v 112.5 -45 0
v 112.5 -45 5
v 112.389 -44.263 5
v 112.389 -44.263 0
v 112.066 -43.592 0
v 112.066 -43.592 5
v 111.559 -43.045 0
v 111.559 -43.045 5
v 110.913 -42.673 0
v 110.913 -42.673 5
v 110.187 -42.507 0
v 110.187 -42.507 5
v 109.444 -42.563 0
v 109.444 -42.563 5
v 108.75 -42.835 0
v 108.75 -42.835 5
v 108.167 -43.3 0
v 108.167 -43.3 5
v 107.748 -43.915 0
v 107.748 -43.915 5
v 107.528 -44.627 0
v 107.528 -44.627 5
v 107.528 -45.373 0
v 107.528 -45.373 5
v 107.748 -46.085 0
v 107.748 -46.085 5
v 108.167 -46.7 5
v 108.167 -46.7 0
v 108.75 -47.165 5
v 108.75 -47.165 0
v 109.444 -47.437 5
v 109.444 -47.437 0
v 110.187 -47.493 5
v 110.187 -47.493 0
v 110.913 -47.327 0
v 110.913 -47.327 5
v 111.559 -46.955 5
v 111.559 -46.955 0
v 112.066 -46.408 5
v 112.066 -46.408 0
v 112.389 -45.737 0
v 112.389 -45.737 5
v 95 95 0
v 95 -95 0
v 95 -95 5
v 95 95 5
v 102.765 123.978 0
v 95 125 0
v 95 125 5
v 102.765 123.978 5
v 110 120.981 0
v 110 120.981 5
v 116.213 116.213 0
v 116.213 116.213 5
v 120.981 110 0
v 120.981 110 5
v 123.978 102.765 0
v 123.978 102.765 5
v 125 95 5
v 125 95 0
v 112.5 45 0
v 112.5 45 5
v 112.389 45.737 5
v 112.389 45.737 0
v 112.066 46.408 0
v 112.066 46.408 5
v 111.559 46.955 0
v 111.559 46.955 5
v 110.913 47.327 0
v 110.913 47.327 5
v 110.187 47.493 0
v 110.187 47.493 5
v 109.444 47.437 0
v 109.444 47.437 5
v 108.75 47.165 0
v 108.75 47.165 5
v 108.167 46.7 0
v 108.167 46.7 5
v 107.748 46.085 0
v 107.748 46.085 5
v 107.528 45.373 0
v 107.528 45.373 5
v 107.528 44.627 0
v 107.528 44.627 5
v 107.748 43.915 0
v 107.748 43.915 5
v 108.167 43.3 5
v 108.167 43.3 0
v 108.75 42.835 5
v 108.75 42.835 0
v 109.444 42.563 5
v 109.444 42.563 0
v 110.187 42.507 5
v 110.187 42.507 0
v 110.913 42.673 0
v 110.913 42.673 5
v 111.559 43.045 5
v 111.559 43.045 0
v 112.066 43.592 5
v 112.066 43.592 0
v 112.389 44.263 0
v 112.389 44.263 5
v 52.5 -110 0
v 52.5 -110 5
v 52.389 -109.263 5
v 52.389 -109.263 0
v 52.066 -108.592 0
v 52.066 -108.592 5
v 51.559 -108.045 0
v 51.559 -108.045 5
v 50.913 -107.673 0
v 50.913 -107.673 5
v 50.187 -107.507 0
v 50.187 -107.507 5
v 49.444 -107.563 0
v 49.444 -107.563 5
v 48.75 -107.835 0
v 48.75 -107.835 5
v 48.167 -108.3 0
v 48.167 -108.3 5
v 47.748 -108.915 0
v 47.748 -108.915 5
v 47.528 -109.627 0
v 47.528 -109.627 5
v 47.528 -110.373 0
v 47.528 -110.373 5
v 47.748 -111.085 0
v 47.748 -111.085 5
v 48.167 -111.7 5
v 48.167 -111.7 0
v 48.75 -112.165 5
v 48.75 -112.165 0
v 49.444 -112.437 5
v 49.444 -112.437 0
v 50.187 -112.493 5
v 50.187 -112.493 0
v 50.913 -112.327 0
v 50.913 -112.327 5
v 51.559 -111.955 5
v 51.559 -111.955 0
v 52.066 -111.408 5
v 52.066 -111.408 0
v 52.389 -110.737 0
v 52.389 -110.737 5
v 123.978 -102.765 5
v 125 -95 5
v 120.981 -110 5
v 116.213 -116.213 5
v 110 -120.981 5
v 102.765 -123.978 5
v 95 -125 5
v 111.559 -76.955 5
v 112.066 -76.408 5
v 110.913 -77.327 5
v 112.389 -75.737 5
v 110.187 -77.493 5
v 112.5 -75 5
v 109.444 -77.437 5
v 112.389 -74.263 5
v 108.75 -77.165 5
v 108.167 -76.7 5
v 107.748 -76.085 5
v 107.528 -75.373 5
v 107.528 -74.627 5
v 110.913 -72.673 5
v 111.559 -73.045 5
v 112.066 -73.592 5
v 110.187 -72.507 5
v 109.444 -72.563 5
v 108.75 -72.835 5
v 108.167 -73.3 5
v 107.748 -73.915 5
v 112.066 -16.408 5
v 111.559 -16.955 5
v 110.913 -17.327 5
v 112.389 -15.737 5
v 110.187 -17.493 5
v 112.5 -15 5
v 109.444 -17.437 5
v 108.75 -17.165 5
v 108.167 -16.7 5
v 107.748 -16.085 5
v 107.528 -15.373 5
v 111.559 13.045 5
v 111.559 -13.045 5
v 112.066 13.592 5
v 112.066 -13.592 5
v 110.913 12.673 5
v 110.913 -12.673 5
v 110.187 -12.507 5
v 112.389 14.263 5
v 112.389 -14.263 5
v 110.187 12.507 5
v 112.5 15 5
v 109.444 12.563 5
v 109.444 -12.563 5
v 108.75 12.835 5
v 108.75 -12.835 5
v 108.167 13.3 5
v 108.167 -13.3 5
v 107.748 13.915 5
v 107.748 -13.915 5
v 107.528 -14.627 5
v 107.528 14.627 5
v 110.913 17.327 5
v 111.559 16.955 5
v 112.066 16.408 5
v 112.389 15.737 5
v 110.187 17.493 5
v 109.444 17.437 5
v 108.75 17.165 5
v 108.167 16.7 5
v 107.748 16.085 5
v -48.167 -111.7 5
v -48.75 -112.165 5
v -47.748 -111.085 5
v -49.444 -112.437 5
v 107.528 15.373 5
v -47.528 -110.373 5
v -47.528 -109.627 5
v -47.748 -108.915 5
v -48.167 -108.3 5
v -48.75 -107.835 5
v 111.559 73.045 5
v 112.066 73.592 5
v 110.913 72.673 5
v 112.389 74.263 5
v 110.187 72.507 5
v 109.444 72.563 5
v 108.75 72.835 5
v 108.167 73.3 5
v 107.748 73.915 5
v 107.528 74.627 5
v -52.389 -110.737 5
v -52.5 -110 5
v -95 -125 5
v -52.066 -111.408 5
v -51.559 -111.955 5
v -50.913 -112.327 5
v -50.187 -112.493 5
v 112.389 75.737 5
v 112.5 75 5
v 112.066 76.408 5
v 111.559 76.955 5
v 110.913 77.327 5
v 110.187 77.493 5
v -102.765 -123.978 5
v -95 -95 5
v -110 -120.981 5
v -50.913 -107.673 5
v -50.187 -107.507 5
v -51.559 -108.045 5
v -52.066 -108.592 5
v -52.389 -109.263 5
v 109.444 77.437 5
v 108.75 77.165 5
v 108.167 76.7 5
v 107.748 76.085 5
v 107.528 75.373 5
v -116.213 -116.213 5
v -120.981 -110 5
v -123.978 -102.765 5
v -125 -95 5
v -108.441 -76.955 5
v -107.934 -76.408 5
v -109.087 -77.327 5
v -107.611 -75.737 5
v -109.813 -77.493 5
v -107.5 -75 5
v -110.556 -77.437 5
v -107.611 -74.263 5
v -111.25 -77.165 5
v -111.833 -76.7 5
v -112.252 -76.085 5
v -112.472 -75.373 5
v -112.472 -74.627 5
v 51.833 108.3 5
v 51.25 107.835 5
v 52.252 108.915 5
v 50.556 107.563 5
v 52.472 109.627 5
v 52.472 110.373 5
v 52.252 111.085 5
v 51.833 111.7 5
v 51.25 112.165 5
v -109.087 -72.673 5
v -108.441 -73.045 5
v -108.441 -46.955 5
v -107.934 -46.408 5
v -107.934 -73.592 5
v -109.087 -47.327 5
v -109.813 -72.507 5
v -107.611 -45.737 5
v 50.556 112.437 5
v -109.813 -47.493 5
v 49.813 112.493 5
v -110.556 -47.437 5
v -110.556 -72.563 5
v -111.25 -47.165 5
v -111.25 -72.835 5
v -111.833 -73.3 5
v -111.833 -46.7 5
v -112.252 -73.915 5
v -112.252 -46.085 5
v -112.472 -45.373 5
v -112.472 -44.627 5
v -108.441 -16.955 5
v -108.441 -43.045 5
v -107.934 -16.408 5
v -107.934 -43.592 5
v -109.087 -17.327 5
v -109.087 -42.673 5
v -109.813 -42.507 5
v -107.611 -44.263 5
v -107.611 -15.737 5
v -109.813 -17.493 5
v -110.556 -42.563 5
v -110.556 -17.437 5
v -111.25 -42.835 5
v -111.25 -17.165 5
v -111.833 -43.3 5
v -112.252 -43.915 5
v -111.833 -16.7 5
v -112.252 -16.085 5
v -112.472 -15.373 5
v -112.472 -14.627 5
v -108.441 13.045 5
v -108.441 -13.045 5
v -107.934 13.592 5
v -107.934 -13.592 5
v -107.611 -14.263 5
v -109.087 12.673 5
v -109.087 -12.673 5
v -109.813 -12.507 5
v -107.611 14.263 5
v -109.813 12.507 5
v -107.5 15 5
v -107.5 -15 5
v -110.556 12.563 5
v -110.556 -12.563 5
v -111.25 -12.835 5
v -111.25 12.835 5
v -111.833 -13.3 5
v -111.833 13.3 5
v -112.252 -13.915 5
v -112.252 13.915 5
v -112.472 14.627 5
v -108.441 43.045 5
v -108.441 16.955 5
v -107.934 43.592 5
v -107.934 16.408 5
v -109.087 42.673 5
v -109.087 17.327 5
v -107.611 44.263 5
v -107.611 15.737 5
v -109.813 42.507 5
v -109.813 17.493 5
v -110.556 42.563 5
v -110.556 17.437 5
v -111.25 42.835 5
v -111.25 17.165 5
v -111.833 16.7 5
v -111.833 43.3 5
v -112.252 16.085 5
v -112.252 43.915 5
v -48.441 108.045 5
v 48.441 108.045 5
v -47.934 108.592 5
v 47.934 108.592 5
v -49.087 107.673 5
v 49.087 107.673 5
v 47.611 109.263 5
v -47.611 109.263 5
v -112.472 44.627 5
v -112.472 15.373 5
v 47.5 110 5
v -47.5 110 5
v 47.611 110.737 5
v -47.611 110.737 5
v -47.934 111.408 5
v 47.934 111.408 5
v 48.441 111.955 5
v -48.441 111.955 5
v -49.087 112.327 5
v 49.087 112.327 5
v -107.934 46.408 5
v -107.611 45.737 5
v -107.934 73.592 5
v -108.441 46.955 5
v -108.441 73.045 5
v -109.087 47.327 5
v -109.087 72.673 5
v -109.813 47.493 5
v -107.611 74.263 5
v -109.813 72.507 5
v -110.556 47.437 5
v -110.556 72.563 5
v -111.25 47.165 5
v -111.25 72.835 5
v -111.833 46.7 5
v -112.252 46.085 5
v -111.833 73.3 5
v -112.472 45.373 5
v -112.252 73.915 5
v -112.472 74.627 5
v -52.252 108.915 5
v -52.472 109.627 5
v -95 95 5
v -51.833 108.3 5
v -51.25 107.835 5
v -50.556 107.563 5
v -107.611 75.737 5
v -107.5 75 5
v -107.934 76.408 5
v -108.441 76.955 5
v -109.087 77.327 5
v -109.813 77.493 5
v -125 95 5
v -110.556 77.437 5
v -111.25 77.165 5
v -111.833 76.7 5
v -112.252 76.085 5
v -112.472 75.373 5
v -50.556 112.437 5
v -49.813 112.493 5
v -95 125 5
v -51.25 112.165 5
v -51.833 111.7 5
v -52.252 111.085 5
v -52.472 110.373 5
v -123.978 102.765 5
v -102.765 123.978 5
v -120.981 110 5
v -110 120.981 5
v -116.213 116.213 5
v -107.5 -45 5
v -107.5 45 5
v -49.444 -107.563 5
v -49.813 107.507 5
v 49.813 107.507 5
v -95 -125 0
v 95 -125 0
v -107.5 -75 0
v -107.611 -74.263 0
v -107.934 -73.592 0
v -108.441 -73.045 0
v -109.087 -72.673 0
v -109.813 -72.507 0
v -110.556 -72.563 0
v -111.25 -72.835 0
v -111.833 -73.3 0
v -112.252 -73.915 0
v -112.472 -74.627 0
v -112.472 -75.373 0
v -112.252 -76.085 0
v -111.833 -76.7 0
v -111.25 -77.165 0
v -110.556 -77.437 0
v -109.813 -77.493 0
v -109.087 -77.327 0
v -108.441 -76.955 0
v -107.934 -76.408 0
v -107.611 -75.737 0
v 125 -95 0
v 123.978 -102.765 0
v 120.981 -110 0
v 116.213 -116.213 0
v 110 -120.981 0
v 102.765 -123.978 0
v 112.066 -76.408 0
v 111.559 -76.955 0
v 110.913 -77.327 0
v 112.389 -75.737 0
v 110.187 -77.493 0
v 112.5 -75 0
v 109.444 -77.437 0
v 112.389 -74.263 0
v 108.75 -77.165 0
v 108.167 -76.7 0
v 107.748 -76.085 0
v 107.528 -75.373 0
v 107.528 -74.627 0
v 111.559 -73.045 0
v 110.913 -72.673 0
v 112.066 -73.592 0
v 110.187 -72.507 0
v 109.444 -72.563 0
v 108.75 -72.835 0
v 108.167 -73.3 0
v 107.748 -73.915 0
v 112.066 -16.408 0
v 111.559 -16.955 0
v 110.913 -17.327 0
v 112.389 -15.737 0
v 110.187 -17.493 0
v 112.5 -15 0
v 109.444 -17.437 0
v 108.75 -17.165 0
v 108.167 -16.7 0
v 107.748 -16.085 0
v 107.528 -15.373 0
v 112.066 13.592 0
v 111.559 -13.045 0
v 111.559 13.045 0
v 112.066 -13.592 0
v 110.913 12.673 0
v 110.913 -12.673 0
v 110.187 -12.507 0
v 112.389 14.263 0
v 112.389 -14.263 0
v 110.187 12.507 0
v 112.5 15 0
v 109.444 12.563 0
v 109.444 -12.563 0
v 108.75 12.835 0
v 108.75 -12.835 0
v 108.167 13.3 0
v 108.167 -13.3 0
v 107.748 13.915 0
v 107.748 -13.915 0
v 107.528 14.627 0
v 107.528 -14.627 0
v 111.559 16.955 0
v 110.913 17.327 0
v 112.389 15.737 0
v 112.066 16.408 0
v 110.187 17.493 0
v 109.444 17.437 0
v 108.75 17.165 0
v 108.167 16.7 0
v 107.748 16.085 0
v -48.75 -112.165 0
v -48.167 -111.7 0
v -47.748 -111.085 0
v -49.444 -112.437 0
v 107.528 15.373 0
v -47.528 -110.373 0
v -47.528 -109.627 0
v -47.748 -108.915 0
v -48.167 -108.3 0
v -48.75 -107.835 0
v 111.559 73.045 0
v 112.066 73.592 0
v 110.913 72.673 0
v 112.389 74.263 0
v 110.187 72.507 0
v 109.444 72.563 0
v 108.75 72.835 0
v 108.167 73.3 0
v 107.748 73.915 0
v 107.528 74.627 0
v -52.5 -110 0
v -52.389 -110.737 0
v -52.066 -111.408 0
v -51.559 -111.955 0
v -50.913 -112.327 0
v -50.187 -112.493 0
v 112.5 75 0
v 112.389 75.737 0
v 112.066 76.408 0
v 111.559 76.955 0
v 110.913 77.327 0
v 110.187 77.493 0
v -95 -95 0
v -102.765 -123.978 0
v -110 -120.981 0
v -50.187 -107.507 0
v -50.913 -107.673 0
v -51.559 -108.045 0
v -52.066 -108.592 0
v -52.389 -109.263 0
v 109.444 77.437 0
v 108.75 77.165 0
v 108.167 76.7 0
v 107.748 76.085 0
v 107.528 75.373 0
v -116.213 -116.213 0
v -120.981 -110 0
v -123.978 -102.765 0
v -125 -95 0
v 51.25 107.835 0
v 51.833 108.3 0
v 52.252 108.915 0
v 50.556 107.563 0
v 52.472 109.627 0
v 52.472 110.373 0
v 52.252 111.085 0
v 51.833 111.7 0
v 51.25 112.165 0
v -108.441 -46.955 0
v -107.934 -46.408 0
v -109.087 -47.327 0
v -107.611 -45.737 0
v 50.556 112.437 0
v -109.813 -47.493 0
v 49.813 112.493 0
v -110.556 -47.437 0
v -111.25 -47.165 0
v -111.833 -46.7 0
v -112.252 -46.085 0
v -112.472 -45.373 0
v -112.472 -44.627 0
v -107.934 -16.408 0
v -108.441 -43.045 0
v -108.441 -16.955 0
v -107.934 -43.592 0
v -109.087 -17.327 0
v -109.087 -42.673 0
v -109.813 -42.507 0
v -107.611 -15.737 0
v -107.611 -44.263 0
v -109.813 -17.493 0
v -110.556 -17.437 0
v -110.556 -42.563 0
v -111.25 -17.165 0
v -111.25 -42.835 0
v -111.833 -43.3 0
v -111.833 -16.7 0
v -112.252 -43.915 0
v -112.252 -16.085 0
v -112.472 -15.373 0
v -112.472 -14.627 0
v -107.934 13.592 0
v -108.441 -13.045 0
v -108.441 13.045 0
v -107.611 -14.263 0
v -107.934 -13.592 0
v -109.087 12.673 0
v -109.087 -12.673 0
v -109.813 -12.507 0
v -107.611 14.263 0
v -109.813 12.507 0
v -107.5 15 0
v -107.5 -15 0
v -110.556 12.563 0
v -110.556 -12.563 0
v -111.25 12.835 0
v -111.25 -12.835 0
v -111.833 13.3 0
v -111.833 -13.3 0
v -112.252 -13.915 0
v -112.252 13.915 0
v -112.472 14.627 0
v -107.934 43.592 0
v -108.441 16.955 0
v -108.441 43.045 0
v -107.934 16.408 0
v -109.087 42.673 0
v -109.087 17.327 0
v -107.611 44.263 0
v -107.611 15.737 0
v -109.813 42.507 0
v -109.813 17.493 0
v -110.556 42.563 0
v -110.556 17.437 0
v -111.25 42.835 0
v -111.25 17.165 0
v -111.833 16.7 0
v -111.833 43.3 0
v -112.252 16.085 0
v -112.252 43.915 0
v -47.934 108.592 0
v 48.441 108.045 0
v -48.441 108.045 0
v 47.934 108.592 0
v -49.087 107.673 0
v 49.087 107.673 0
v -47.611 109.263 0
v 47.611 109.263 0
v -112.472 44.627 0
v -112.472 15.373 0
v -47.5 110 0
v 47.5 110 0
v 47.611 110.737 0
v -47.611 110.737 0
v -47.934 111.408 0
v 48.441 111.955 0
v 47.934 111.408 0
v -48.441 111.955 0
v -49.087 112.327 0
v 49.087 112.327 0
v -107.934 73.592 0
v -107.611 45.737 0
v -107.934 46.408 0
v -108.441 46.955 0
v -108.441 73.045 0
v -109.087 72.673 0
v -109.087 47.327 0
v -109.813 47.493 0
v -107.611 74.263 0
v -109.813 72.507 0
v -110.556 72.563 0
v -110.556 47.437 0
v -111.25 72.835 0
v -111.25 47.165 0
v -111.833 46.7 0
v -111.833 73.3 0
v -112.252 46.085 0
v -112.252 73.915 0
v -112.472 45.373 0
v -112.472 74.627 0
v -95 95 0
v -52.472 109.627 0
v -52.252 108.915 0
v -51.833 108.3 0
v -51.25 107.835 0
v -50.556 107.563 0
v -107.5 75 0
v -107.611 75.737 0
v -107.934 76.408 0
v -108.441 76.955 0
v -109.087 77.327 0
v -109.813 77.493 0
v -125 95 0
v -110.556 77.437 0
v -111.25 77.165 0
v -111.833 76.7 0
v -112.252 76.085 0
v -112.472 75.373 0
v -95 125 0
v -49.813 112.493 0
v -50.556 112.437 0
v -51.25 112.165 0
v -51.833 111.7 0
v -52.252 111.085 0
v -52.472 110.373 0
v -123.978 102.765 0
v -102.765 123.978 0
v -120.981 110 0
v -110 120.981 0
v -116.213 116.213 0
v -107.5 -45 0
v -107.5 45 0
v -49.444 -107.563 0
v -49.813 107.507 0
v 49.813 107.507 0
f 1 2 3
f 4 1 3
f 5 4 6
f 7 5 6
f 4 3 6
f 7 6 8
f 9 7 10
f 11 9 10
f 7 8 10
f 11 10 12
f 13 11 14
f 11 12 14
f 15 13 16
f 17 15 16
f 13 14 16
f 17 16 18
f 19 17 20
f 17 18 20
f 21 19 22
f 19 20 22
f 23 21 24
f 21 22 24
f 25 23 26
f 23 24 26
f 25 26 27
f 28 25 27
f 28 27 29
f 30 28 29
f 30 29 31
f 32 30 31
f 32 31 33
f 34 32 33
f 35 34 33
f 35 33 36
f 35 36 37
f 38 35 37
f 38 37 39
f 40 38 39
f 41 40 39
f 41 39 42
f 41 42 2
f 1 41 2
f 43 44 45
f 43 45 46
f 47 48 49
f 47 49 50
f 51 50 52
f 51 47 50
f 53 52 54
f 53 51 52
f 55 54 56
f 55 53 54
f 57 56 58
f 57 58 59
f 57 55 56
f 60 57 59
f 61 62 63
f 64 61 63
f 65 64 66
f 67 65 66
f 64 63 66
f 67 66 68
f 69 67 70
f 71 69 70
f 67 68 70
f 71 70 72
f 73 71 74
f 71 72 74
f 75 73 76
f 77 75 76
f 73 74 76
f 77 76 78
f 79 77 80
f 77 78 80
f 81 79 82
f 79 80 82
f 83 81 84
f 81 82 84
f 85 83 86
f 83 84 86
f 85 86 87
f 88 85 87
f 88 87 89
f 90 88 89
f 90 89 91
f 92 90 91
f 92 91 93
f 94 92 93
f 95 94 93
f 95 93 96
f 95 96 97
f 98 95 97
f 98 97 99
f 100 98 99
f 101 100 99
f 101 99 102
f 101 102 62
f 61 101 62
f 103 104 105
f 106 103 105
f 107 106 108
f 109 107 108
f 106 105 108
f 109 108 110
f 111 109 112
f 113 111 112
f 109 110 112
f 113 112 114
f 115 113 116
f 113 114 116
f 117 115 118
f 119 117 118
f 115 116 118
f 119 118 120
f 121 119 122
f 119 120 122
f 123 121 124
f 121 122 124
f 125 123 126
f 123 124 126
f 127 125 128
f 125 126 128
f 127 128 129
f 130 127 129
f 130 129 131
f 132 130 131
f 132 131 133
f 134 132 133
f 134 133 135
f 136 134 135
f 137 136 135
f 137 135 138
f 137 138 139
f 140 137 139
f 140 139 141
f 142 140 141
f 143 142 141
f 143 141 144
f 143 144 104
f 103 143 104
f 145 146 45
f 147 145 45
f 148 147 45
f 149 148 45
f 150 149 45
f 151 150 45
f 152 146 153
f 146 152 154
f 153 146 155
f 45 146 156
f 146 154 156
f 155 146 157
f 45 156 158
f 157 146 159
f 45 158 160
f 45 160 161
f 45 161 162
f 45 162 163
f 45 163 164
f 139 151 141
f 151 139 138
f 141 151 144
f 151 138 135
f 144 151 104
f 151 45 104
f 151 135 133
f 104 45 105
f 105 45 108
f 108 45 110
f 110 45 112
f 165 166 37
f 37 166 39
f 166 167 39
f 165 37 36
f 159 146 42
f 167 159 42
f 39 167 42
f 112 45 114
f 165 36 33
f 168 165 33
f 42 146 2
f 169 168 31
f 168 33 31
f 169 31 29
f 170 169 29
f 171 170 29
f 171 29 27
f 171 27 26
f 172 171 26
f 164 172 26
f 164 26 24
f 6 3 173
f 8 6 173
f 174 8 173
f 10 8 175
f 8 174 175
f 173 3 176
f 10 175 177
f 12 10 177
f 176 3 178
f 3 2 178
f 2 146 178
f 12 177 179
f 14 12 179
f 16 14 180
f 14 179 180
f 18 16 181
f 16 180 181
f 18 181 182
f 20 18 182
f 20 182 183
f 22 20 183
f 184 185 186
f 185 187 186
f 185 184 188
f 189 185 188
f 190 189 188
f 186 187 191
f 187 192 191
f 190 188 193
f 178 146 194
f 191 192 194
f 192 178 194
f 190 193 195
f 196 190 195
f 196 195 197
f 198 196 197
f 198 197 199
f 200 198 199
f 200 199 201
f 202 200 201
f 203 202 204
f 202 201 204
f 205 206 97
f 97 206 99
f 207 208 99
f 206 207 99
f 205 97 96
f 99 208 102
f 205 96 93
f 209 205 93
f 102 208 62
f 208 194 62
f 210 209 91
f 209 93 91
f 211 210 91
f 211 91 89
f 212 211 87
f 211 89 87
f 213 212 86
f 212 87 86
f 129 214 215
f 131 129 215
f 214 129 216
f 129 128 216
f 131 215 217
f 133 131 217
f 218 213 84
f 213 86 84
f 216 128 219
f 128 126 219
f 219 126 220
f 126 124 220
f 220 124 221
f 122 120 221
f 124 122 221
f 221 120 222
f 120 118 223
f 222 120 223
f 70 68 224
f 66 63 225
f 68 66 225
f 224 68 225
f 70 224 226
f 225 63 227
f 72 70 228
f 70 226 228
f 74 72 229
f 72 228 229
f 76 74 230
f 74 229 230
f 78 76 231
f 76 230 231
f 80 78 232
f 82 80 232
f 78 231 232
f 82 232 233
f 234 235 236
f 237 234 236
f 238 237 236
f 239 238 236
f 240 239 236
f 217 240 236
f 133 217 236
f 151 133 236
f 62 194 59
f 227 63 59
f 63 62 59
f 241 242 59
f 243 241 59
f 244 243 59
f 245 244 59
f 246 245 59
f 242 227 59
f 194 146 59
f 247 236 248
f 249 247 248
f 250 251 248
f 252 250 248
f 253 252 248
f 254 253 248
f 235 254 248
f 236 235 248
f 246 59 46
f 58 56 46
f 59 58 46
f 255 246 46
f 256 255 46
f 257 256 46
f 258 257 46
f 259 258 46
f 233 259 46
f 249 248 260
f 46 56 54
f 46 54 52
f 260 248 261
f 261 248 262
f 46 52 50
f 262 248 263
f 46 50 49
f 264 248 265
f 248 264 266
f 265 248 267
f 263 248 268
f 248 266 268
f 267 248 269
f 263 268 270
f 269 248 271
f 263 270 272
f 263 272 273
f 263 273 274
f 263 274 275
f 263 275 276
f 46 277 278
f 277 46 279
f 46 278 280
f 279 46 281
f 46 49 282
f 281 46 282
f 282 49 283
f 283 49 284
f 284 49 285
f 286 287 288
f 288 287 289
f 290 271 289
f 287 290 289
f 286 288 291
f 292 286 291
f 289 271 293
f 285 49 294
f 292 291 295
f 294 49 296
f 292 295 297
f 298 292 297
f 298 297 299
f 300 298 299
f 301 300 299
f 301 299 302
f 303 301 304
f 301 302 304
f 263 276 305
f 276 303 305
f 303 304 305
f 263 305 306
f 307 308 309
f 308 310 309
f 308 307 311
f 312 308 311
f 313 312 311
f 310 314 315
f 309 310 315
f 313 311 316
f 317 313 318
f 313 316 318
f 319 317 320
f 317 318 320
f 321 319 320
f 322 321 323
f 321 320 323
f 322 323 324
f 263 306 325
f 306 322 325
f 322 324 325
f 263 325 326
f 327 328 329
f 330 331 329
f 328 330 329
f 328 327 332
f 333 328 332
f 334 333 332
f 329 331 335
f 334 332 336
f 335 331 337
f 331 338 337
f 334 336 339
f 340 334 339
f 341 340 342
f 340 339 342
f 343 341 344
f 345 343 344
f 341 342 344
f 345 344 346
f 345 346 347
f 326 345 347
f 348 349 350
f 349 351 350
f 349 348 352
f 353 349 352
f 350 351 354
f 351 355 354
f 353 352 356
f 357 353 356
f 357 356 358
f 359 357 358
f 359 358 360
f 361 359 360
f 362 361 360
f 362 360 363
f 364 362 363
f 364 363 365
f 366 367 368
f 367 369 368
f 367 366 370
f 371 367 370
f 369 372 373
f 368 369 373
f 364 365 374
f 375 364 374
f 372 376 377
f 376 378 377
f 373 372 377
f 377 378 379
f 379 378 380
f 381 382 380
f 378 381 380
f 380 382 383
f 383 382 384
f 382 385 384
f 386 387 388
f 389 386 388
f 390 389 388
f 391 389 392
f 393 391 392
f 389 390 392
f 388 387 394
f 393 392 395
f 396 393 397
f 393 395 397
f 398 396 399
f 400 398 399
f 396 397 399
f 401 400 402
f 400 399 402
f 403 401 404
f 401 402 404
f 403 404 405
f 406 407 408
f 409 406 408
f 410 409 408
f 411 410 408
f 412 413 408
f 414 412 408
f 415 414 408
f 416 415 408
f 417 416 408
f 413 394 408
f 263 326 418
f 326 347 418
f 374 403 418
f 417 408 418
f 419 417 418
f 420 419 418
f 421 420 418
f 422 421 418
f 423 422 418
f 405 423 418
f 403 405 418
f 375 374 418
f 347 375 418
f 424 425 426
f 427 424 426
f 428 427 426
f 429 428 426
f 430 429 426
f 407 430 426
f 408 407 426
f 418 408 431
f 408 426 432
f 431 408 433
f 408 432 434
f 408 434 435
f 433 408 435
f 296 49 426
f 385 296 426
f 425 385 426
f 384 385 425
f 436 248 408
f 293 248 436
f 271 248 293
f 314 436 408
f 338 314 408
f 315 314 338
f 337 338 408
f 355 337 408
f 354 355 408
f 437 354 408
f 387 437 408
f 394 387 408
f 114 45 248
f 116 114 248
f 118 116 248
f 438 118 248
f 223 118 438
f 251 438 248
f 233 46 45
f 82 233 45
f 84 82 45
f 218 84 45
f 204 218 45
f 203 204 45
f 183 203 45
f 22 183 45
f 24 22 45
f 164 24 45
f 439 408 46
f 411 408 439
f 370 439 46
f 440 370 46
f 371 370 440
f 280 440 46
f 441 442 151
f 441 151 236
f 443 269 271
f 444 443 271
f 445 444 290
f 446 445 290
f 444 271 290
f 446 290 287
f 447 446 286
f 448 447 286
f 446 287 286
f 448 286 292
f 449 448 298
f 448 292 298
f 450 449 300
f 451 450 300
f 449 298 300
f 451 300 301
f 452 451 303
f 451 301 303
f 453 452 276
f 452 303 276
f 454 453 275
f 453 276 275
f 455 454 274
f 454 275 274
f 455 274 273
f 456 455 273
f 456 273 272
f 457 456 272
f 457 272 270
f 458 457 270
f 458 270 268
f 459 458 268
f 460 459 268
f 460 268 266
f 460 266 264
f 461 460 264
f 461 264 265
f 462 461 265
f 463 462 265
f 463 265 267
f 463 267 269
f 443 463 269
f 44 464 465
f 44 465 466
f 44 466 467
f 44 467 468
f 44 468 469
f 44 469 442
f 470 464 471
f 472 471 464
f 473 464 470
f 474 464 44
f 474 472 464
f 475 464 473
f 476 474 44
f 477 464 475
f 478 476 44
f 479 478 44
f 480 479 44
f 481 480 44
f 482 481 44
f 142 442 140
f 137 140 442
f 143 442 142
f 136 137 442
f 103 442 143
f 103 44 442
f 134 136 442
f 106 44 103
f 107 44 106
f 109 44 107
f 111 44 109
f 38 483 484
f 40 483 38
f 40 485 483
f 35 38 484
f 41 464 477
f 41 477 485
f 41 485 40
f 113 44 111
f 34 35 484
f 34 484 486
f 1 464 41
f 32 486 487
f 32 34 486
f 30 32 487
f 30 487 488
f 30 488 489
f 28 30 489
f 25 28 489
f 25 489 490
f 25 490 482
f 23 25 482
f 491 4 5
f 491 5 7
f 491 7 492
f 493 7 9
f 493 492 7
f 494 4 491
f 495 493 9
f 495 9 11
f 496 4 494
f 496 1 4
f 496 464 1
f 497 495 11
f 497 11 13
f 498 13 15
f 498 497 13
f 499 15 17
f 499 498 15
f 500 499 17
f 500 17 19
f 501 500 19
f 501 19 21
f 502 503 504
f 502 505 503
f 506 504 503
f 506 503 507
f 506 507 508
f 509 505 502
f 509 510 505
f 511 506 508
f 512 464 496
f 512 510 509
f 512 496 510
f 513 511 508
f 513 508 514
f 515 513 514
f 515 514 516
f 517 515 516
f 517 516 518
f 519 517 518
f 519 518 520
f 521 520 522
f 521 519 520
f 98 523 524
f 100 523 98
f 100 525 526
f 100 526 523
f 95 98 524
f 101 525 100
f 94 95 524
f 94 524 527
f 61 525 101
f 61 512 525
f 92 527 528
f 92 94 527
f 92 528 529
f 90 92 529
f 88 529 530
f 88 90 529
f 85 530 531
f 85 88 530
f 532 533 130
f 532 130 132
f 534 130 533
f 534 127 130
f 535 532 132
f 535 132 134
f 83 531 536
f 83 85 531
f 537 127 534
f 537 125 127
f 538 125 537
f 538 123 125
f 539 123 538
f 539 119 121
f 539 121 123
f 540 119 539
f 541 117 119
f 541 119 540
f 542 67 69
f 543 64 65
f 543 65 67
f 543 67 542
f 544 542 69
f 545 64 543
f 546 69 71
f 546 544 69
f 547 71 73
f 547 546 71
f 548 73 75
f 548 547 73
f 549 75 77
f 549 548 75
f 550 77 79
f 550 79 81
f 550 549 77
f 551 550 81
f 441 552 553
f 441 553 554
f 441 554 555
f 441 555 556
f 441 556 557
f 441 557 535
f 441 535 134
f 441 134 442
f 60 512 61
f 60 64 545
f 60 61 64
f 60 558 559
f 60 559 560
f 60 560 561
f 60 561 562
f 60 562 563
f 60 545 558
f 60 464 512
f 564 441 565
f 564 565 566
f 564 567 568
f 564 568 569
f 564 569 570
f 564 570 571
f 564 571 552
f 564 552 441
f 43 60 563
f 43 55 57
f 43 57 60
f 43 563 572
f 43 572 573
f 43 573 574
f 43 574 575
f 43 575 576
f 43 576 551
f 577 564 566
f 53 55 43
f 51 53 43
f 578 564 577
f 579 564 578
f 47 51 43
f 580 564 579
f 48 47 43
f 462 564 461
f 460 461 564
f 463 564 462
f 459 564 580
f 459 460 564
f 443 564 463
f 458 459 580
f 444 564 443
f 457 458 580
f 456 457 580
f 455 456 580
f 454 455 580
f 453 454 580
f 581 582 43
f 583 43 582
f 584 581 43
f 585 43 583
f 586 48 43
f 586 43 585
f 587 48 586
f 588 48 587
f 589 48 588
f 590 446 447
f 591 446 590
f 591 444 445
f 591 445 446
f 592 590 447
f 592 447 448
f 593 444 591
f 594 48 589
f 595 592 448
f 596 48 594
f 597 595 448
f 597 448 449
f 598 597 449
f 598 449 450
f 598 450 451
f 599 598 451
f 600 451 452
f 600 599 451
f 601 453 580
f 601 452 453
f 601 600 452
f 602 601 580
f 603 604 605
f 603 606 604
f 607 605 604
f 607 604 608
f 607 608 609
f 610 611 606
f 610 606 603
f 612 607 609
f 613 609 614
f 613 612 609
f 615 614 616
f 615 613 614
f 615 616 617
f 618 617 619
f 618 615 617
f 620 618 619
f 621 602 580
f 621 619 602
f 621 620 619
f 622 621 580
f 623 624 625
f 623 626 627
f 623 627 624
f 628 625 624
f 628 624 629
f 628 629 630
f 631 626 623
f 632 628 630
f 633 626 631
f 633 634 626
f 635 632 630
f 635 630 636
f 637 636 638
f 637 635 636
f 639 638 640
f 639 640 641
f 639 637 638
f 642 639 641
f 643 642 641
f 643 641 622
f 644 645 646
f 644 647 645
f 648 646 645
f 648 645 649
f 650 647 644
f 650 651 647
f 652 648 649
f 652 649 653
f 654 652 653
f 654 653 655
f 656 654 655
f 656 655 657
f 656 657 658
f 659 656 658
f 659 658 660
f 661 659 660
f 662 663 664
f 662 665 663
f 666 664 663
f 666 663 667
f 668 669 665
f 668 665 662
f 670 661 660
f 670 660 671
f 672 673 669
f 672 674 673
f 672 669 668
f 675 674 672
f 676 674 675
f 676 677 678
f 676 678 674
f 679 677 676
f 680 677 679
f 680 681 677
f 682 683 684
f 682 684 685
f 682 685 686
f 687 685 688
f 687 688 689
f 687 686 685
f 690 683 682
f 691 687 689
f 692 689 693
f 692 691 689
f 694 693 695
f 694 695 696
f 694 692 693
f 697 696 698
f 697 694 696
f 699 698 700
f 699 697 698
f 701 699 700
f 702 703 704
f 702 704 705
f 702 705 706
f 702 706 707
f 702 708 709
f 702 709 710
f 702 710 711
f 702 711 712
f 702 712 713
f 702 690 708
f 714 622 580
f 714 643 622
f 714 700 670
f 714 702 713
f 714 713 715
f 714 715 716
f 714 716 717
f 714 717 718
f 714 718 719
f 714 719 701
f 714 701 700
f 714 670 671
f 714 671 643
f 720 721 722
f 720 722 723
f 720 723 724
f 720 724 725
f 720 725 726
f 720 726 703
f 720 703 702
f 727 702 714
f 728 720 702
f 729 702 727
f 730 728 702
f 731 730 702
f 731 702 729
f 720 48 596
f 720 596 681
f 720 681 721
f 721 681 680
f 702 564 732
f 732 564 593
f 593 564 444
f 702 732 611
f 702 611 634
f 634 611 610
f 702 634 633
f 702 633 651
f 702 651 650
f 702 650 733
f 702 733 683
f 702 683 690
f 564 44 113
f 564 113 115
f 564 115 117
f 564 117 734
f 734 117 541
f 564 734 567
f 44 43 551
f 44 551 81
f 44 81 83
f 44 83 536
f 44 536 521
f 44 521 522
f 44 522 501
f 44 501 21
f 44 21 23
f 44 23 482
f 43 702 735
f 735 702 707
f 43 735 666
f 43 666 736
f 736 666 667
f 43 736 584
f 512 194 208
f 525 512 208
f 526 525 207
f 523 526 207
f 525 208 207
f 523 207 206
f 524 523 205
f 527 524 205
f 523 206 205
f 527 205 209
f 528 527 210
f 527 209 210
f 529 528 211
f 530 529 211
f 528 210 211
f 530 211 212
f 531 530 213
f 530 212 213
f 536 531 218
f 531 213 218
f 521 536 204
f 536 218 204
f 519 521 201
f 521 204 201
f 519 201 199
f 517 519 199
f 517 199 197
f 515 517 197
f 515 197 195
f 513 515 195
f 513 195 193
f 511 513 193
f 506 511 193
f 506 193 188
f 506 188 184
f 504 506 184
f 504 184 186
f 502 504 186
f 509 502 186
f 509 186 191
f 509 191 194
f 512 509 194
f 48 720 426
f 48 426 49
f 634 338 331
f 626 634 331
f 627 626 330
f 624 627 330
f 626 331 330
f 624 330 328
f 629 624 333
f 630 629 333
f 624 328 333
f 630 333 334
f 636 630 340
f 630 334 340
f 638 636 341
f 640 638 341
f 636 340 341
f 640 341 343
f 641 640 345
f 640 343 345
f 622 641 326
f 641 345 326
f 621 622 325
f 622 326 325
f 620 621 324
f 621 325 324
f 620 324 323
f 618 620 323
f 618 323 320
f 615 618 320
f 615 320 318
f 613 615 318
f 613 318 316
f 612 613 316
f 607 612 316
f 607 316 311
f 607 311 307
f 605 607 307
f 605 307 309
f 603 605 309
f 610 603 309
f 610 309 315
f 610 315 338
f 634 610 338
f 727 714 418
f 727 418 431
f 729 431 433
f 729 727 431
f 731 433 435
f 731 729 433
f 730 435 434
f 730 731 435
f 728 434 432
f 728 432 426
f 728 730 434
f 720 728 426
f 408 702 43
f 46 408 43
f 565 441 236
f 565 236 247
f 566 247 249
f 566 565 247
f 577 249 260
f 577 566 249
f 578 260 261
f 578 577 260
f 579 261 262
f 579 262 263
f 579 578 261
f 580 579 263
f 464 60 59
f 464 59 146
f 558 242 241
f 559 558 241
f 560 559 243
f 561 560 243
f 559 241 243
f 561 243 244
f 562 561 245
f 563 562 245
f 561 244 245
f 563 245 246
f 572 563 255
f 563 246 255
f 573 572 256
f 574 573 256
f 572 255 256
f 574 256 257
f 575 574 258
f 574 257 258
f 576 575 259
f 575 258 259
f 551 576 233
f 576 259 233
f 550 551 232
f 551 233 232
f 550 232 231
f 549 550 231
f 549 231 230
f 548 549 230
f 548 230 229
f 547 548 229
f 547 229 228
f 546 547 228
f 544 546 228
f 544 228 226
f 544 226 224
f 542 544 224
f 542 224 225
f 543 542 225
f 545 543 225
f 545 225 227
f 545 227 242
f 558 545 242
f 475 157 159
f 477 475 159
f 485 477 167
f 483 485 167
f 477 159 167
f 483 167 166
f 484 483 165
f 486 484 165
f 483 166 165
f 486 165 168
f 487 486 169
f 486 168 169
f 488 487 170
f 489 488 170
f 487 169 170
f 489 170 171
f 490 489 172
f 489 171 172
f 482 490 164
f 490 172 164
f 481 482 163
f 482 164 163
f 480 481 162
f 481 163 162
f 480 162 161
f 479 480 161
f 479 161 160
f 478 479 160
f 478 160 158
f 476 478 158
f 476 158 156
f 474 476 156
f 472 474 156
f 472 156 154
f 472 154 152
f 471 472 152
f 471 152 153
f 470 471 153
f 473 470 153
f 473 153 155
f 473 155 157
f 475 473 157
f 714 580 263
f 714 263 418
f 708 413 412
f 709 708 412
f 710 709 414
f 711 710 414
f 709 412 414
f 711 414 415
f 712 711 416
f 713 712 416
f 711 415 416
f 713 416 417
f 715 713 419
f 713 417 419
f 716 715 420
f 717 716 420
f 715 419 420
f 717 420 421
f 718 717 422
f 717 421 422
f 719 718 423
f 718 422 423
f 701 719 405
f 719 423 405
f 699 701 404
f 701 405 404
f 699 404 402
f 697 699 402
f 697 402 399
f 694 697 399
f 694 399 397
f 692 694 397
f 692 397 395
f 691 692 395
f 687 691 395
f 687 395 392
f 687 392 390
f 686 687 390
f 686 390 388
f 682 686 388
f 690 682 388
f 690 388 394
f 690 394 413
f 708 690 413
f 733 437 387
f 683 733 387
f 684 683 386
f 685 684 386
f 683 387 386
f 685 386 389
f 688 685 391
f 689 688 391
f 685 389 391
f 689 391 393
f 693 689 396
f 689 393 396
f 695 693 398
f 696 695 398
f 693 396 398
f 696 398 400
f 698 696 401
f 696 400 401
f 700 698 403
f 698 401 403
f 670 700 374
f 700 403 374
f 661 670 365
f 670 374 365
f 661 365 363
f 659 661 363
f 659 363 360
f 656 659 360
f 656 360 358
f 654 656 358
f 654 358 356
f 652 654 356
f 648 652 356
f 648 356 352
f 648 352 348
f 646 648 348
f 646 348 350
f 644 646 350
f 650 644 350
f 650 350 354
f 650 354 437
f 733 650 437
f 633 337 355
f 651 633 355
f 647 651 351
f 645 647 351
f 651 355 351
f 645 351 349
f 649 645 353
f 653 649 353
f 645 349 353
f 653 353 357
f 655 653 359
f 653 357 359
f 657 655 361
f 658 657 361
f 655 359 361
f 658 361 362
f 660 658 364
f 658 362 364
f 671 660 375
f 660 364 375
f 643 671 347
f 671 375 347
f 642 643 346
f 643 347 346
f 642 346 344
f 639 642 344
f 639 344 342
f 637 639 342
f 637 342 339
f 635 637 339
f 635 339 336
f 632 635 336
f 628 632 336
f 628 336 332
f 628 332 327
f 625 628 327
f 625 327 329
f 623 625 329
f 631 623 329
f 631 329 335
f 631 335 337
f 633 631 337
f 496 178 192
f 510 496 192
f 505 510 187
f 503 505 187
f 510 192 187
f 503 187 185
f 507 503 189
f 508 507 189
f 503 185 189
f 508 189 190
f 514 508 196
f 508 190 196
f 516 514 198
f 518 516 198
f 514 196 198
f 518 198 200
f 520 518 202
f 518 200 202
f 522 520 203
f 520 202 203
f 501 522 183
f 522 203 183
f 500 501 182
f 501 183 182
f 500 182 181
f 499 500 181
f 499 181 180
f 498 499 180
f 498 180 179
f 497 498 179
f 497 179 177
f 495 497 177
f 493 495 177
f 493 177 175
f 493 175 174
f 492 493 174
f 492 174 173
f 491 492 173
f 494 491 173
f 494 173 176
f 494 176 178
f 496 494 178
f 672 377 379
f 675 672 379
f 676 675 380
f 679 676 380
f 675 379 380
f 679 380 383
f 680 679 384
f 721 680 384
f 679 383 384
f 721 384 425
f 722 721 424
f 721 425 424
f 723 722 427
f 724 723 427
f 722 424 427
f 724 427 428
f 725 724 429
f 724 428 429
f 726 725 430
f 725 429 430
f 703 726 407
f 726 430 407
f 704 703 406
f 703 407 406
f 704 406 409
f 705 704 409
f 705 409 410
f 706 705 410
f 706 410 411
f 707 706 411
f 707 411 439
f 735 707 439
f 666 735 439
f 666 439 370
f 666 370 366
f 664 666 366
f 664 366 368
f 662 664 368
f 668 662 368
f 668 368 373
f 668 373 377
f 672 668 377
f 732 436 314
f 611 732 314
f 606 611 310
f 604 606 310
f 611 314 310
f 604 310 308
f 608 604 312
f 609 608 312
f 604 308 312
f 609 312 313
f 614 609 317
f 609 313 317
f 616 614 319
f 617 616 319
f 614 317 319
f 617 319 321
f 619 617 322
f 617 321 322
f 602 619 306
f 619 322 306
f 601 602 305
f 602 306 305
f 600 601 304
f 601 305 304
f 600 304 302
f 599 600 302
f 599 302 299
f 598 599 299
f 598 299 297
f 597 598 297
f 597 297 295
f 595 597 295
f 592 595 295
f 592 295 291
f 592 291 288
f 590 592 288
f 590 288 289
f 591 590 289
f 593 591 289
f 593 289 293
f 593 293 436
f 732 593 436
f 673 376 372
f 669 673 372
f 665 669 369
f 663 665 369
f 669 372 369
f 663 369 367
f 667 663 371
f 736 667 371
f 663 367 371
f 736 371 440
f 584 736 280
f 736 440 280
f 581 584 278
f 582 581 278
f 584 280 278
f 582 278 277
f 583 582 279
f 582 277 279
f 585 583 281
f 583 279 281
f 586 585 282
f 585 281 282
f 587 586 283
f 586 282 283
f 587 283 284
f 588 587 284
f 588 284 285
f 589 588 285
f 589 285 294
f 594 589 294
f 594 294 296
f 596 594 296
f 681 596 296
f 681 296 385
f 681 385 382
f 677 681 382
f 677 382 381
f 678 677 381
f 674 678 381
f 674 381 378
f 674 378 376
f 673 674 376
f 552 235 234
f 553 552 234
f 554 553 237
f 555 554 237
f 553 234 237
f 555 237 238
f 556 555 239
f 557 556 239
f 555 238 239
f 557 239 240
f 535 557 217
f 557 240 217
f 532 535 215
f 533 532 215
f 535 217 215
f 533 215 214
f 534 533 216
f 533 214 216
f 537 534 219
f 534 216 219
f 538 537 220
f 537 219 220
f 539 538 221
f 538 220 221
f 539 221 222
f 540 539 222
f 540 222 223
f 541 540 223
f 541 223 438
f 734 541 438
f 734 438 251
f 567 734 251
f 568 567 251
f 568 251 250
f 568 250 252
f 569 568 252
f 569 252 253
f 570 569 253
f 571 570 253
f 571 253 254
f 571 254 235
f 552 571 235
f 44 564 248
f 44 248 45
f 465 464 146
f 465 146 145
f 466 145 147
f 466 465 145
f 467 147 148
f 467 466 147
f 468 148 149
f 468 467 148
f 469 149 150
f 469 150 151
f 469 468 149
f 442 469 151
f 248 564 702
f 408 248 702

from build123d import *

# Parameters (mm, degrees)
SKETCH1_W           = 190
SKETCH1_H           = 190
BOSS_EXTRUDE1_DEPTH = 5
SKETCH2_R           = 2.5
CUT_EXTRUDE1_DEPTH  = 177.847391838
LPATTERN1_COUNT     = 6
LPATTERN1_PITCH     = 30
SKETCH3_R           = 2.5
CUT_EXTRUDE2_DEPTH  = 177.847391838


with BuildPart() as part:
    # Sketch1 → Boss-Extrude1 (new body)
    with BuildSketch(Plane.XY):
        with BuildLine():
            Line((-95, 125), (95, 125))
            ThreePointArc((95, 125), (116.213203436, 116.213203436), (125, 95))
            Line((125, 95), (125, -95))
            ThreePointArc((125, -95), (116.213203436, -116.213203436), (95, -125))
            Line((95, -125), (-95, -125))
            ThreePointArc((-95, -125), (-116.213203436, -116.213203436), (-125, -95))
            Line((-125, -95), (-125, 95))
            ThreePointArc((-125, 95), (-116.213203436, 116.213203436), (-95, 125))
        make_face()
        Rectangle(SKETCH1_W, SKETCH1_H, mode=Mode.SUBTRACT)
    extrude(amount=BOSS_EXTRUDE1_DEPTH)

    # Sketch2 → Cut-Extrude1 (cut, through all)
    with BuildSketch(Plane.XY.offset(5)):
        with Locations((-110, 75)):
            Circle(SKETCH2_R)
        with Locations((110, 75)):
            Circle(SKETCH2_R)
    cut_extrude1 = extrude(amount=-CUT_EXTRUDE1_DEPTH, mode=Mode.SUBTRACT)

    # LPattern1: Cut-Extrude1 ×6
    with Locations(*[(0, -i * LPATTERN1_PITCH, 0) for i in range(1, LPATTERN1_COUNT)]):
        add(cut_extrude1, mode=Mode.SUBTRACT)

    # Sketch3 → Cut-Extrude2 (cut, through all)
    with BuildSketch(Plane.XY.offset(5)):
        with Locations((-50, 110)):
            Circle(SKETCH3_R)
        with Locations(Location((50, 110, 0), (0, 0, 180))):
            Circle(SKETCH3_R)
        with Locations(Location((-50, -110, 0), (0, 0, 180))):
            Circle(SKETCH3_R)
        with Locations((50, -110)):
            Circle(SKETCH3_R)
    extrude(amount=-CUT_EXTRUDE2_DEPTH, mode=Mode.SUBTRACT)


solid = part.part
